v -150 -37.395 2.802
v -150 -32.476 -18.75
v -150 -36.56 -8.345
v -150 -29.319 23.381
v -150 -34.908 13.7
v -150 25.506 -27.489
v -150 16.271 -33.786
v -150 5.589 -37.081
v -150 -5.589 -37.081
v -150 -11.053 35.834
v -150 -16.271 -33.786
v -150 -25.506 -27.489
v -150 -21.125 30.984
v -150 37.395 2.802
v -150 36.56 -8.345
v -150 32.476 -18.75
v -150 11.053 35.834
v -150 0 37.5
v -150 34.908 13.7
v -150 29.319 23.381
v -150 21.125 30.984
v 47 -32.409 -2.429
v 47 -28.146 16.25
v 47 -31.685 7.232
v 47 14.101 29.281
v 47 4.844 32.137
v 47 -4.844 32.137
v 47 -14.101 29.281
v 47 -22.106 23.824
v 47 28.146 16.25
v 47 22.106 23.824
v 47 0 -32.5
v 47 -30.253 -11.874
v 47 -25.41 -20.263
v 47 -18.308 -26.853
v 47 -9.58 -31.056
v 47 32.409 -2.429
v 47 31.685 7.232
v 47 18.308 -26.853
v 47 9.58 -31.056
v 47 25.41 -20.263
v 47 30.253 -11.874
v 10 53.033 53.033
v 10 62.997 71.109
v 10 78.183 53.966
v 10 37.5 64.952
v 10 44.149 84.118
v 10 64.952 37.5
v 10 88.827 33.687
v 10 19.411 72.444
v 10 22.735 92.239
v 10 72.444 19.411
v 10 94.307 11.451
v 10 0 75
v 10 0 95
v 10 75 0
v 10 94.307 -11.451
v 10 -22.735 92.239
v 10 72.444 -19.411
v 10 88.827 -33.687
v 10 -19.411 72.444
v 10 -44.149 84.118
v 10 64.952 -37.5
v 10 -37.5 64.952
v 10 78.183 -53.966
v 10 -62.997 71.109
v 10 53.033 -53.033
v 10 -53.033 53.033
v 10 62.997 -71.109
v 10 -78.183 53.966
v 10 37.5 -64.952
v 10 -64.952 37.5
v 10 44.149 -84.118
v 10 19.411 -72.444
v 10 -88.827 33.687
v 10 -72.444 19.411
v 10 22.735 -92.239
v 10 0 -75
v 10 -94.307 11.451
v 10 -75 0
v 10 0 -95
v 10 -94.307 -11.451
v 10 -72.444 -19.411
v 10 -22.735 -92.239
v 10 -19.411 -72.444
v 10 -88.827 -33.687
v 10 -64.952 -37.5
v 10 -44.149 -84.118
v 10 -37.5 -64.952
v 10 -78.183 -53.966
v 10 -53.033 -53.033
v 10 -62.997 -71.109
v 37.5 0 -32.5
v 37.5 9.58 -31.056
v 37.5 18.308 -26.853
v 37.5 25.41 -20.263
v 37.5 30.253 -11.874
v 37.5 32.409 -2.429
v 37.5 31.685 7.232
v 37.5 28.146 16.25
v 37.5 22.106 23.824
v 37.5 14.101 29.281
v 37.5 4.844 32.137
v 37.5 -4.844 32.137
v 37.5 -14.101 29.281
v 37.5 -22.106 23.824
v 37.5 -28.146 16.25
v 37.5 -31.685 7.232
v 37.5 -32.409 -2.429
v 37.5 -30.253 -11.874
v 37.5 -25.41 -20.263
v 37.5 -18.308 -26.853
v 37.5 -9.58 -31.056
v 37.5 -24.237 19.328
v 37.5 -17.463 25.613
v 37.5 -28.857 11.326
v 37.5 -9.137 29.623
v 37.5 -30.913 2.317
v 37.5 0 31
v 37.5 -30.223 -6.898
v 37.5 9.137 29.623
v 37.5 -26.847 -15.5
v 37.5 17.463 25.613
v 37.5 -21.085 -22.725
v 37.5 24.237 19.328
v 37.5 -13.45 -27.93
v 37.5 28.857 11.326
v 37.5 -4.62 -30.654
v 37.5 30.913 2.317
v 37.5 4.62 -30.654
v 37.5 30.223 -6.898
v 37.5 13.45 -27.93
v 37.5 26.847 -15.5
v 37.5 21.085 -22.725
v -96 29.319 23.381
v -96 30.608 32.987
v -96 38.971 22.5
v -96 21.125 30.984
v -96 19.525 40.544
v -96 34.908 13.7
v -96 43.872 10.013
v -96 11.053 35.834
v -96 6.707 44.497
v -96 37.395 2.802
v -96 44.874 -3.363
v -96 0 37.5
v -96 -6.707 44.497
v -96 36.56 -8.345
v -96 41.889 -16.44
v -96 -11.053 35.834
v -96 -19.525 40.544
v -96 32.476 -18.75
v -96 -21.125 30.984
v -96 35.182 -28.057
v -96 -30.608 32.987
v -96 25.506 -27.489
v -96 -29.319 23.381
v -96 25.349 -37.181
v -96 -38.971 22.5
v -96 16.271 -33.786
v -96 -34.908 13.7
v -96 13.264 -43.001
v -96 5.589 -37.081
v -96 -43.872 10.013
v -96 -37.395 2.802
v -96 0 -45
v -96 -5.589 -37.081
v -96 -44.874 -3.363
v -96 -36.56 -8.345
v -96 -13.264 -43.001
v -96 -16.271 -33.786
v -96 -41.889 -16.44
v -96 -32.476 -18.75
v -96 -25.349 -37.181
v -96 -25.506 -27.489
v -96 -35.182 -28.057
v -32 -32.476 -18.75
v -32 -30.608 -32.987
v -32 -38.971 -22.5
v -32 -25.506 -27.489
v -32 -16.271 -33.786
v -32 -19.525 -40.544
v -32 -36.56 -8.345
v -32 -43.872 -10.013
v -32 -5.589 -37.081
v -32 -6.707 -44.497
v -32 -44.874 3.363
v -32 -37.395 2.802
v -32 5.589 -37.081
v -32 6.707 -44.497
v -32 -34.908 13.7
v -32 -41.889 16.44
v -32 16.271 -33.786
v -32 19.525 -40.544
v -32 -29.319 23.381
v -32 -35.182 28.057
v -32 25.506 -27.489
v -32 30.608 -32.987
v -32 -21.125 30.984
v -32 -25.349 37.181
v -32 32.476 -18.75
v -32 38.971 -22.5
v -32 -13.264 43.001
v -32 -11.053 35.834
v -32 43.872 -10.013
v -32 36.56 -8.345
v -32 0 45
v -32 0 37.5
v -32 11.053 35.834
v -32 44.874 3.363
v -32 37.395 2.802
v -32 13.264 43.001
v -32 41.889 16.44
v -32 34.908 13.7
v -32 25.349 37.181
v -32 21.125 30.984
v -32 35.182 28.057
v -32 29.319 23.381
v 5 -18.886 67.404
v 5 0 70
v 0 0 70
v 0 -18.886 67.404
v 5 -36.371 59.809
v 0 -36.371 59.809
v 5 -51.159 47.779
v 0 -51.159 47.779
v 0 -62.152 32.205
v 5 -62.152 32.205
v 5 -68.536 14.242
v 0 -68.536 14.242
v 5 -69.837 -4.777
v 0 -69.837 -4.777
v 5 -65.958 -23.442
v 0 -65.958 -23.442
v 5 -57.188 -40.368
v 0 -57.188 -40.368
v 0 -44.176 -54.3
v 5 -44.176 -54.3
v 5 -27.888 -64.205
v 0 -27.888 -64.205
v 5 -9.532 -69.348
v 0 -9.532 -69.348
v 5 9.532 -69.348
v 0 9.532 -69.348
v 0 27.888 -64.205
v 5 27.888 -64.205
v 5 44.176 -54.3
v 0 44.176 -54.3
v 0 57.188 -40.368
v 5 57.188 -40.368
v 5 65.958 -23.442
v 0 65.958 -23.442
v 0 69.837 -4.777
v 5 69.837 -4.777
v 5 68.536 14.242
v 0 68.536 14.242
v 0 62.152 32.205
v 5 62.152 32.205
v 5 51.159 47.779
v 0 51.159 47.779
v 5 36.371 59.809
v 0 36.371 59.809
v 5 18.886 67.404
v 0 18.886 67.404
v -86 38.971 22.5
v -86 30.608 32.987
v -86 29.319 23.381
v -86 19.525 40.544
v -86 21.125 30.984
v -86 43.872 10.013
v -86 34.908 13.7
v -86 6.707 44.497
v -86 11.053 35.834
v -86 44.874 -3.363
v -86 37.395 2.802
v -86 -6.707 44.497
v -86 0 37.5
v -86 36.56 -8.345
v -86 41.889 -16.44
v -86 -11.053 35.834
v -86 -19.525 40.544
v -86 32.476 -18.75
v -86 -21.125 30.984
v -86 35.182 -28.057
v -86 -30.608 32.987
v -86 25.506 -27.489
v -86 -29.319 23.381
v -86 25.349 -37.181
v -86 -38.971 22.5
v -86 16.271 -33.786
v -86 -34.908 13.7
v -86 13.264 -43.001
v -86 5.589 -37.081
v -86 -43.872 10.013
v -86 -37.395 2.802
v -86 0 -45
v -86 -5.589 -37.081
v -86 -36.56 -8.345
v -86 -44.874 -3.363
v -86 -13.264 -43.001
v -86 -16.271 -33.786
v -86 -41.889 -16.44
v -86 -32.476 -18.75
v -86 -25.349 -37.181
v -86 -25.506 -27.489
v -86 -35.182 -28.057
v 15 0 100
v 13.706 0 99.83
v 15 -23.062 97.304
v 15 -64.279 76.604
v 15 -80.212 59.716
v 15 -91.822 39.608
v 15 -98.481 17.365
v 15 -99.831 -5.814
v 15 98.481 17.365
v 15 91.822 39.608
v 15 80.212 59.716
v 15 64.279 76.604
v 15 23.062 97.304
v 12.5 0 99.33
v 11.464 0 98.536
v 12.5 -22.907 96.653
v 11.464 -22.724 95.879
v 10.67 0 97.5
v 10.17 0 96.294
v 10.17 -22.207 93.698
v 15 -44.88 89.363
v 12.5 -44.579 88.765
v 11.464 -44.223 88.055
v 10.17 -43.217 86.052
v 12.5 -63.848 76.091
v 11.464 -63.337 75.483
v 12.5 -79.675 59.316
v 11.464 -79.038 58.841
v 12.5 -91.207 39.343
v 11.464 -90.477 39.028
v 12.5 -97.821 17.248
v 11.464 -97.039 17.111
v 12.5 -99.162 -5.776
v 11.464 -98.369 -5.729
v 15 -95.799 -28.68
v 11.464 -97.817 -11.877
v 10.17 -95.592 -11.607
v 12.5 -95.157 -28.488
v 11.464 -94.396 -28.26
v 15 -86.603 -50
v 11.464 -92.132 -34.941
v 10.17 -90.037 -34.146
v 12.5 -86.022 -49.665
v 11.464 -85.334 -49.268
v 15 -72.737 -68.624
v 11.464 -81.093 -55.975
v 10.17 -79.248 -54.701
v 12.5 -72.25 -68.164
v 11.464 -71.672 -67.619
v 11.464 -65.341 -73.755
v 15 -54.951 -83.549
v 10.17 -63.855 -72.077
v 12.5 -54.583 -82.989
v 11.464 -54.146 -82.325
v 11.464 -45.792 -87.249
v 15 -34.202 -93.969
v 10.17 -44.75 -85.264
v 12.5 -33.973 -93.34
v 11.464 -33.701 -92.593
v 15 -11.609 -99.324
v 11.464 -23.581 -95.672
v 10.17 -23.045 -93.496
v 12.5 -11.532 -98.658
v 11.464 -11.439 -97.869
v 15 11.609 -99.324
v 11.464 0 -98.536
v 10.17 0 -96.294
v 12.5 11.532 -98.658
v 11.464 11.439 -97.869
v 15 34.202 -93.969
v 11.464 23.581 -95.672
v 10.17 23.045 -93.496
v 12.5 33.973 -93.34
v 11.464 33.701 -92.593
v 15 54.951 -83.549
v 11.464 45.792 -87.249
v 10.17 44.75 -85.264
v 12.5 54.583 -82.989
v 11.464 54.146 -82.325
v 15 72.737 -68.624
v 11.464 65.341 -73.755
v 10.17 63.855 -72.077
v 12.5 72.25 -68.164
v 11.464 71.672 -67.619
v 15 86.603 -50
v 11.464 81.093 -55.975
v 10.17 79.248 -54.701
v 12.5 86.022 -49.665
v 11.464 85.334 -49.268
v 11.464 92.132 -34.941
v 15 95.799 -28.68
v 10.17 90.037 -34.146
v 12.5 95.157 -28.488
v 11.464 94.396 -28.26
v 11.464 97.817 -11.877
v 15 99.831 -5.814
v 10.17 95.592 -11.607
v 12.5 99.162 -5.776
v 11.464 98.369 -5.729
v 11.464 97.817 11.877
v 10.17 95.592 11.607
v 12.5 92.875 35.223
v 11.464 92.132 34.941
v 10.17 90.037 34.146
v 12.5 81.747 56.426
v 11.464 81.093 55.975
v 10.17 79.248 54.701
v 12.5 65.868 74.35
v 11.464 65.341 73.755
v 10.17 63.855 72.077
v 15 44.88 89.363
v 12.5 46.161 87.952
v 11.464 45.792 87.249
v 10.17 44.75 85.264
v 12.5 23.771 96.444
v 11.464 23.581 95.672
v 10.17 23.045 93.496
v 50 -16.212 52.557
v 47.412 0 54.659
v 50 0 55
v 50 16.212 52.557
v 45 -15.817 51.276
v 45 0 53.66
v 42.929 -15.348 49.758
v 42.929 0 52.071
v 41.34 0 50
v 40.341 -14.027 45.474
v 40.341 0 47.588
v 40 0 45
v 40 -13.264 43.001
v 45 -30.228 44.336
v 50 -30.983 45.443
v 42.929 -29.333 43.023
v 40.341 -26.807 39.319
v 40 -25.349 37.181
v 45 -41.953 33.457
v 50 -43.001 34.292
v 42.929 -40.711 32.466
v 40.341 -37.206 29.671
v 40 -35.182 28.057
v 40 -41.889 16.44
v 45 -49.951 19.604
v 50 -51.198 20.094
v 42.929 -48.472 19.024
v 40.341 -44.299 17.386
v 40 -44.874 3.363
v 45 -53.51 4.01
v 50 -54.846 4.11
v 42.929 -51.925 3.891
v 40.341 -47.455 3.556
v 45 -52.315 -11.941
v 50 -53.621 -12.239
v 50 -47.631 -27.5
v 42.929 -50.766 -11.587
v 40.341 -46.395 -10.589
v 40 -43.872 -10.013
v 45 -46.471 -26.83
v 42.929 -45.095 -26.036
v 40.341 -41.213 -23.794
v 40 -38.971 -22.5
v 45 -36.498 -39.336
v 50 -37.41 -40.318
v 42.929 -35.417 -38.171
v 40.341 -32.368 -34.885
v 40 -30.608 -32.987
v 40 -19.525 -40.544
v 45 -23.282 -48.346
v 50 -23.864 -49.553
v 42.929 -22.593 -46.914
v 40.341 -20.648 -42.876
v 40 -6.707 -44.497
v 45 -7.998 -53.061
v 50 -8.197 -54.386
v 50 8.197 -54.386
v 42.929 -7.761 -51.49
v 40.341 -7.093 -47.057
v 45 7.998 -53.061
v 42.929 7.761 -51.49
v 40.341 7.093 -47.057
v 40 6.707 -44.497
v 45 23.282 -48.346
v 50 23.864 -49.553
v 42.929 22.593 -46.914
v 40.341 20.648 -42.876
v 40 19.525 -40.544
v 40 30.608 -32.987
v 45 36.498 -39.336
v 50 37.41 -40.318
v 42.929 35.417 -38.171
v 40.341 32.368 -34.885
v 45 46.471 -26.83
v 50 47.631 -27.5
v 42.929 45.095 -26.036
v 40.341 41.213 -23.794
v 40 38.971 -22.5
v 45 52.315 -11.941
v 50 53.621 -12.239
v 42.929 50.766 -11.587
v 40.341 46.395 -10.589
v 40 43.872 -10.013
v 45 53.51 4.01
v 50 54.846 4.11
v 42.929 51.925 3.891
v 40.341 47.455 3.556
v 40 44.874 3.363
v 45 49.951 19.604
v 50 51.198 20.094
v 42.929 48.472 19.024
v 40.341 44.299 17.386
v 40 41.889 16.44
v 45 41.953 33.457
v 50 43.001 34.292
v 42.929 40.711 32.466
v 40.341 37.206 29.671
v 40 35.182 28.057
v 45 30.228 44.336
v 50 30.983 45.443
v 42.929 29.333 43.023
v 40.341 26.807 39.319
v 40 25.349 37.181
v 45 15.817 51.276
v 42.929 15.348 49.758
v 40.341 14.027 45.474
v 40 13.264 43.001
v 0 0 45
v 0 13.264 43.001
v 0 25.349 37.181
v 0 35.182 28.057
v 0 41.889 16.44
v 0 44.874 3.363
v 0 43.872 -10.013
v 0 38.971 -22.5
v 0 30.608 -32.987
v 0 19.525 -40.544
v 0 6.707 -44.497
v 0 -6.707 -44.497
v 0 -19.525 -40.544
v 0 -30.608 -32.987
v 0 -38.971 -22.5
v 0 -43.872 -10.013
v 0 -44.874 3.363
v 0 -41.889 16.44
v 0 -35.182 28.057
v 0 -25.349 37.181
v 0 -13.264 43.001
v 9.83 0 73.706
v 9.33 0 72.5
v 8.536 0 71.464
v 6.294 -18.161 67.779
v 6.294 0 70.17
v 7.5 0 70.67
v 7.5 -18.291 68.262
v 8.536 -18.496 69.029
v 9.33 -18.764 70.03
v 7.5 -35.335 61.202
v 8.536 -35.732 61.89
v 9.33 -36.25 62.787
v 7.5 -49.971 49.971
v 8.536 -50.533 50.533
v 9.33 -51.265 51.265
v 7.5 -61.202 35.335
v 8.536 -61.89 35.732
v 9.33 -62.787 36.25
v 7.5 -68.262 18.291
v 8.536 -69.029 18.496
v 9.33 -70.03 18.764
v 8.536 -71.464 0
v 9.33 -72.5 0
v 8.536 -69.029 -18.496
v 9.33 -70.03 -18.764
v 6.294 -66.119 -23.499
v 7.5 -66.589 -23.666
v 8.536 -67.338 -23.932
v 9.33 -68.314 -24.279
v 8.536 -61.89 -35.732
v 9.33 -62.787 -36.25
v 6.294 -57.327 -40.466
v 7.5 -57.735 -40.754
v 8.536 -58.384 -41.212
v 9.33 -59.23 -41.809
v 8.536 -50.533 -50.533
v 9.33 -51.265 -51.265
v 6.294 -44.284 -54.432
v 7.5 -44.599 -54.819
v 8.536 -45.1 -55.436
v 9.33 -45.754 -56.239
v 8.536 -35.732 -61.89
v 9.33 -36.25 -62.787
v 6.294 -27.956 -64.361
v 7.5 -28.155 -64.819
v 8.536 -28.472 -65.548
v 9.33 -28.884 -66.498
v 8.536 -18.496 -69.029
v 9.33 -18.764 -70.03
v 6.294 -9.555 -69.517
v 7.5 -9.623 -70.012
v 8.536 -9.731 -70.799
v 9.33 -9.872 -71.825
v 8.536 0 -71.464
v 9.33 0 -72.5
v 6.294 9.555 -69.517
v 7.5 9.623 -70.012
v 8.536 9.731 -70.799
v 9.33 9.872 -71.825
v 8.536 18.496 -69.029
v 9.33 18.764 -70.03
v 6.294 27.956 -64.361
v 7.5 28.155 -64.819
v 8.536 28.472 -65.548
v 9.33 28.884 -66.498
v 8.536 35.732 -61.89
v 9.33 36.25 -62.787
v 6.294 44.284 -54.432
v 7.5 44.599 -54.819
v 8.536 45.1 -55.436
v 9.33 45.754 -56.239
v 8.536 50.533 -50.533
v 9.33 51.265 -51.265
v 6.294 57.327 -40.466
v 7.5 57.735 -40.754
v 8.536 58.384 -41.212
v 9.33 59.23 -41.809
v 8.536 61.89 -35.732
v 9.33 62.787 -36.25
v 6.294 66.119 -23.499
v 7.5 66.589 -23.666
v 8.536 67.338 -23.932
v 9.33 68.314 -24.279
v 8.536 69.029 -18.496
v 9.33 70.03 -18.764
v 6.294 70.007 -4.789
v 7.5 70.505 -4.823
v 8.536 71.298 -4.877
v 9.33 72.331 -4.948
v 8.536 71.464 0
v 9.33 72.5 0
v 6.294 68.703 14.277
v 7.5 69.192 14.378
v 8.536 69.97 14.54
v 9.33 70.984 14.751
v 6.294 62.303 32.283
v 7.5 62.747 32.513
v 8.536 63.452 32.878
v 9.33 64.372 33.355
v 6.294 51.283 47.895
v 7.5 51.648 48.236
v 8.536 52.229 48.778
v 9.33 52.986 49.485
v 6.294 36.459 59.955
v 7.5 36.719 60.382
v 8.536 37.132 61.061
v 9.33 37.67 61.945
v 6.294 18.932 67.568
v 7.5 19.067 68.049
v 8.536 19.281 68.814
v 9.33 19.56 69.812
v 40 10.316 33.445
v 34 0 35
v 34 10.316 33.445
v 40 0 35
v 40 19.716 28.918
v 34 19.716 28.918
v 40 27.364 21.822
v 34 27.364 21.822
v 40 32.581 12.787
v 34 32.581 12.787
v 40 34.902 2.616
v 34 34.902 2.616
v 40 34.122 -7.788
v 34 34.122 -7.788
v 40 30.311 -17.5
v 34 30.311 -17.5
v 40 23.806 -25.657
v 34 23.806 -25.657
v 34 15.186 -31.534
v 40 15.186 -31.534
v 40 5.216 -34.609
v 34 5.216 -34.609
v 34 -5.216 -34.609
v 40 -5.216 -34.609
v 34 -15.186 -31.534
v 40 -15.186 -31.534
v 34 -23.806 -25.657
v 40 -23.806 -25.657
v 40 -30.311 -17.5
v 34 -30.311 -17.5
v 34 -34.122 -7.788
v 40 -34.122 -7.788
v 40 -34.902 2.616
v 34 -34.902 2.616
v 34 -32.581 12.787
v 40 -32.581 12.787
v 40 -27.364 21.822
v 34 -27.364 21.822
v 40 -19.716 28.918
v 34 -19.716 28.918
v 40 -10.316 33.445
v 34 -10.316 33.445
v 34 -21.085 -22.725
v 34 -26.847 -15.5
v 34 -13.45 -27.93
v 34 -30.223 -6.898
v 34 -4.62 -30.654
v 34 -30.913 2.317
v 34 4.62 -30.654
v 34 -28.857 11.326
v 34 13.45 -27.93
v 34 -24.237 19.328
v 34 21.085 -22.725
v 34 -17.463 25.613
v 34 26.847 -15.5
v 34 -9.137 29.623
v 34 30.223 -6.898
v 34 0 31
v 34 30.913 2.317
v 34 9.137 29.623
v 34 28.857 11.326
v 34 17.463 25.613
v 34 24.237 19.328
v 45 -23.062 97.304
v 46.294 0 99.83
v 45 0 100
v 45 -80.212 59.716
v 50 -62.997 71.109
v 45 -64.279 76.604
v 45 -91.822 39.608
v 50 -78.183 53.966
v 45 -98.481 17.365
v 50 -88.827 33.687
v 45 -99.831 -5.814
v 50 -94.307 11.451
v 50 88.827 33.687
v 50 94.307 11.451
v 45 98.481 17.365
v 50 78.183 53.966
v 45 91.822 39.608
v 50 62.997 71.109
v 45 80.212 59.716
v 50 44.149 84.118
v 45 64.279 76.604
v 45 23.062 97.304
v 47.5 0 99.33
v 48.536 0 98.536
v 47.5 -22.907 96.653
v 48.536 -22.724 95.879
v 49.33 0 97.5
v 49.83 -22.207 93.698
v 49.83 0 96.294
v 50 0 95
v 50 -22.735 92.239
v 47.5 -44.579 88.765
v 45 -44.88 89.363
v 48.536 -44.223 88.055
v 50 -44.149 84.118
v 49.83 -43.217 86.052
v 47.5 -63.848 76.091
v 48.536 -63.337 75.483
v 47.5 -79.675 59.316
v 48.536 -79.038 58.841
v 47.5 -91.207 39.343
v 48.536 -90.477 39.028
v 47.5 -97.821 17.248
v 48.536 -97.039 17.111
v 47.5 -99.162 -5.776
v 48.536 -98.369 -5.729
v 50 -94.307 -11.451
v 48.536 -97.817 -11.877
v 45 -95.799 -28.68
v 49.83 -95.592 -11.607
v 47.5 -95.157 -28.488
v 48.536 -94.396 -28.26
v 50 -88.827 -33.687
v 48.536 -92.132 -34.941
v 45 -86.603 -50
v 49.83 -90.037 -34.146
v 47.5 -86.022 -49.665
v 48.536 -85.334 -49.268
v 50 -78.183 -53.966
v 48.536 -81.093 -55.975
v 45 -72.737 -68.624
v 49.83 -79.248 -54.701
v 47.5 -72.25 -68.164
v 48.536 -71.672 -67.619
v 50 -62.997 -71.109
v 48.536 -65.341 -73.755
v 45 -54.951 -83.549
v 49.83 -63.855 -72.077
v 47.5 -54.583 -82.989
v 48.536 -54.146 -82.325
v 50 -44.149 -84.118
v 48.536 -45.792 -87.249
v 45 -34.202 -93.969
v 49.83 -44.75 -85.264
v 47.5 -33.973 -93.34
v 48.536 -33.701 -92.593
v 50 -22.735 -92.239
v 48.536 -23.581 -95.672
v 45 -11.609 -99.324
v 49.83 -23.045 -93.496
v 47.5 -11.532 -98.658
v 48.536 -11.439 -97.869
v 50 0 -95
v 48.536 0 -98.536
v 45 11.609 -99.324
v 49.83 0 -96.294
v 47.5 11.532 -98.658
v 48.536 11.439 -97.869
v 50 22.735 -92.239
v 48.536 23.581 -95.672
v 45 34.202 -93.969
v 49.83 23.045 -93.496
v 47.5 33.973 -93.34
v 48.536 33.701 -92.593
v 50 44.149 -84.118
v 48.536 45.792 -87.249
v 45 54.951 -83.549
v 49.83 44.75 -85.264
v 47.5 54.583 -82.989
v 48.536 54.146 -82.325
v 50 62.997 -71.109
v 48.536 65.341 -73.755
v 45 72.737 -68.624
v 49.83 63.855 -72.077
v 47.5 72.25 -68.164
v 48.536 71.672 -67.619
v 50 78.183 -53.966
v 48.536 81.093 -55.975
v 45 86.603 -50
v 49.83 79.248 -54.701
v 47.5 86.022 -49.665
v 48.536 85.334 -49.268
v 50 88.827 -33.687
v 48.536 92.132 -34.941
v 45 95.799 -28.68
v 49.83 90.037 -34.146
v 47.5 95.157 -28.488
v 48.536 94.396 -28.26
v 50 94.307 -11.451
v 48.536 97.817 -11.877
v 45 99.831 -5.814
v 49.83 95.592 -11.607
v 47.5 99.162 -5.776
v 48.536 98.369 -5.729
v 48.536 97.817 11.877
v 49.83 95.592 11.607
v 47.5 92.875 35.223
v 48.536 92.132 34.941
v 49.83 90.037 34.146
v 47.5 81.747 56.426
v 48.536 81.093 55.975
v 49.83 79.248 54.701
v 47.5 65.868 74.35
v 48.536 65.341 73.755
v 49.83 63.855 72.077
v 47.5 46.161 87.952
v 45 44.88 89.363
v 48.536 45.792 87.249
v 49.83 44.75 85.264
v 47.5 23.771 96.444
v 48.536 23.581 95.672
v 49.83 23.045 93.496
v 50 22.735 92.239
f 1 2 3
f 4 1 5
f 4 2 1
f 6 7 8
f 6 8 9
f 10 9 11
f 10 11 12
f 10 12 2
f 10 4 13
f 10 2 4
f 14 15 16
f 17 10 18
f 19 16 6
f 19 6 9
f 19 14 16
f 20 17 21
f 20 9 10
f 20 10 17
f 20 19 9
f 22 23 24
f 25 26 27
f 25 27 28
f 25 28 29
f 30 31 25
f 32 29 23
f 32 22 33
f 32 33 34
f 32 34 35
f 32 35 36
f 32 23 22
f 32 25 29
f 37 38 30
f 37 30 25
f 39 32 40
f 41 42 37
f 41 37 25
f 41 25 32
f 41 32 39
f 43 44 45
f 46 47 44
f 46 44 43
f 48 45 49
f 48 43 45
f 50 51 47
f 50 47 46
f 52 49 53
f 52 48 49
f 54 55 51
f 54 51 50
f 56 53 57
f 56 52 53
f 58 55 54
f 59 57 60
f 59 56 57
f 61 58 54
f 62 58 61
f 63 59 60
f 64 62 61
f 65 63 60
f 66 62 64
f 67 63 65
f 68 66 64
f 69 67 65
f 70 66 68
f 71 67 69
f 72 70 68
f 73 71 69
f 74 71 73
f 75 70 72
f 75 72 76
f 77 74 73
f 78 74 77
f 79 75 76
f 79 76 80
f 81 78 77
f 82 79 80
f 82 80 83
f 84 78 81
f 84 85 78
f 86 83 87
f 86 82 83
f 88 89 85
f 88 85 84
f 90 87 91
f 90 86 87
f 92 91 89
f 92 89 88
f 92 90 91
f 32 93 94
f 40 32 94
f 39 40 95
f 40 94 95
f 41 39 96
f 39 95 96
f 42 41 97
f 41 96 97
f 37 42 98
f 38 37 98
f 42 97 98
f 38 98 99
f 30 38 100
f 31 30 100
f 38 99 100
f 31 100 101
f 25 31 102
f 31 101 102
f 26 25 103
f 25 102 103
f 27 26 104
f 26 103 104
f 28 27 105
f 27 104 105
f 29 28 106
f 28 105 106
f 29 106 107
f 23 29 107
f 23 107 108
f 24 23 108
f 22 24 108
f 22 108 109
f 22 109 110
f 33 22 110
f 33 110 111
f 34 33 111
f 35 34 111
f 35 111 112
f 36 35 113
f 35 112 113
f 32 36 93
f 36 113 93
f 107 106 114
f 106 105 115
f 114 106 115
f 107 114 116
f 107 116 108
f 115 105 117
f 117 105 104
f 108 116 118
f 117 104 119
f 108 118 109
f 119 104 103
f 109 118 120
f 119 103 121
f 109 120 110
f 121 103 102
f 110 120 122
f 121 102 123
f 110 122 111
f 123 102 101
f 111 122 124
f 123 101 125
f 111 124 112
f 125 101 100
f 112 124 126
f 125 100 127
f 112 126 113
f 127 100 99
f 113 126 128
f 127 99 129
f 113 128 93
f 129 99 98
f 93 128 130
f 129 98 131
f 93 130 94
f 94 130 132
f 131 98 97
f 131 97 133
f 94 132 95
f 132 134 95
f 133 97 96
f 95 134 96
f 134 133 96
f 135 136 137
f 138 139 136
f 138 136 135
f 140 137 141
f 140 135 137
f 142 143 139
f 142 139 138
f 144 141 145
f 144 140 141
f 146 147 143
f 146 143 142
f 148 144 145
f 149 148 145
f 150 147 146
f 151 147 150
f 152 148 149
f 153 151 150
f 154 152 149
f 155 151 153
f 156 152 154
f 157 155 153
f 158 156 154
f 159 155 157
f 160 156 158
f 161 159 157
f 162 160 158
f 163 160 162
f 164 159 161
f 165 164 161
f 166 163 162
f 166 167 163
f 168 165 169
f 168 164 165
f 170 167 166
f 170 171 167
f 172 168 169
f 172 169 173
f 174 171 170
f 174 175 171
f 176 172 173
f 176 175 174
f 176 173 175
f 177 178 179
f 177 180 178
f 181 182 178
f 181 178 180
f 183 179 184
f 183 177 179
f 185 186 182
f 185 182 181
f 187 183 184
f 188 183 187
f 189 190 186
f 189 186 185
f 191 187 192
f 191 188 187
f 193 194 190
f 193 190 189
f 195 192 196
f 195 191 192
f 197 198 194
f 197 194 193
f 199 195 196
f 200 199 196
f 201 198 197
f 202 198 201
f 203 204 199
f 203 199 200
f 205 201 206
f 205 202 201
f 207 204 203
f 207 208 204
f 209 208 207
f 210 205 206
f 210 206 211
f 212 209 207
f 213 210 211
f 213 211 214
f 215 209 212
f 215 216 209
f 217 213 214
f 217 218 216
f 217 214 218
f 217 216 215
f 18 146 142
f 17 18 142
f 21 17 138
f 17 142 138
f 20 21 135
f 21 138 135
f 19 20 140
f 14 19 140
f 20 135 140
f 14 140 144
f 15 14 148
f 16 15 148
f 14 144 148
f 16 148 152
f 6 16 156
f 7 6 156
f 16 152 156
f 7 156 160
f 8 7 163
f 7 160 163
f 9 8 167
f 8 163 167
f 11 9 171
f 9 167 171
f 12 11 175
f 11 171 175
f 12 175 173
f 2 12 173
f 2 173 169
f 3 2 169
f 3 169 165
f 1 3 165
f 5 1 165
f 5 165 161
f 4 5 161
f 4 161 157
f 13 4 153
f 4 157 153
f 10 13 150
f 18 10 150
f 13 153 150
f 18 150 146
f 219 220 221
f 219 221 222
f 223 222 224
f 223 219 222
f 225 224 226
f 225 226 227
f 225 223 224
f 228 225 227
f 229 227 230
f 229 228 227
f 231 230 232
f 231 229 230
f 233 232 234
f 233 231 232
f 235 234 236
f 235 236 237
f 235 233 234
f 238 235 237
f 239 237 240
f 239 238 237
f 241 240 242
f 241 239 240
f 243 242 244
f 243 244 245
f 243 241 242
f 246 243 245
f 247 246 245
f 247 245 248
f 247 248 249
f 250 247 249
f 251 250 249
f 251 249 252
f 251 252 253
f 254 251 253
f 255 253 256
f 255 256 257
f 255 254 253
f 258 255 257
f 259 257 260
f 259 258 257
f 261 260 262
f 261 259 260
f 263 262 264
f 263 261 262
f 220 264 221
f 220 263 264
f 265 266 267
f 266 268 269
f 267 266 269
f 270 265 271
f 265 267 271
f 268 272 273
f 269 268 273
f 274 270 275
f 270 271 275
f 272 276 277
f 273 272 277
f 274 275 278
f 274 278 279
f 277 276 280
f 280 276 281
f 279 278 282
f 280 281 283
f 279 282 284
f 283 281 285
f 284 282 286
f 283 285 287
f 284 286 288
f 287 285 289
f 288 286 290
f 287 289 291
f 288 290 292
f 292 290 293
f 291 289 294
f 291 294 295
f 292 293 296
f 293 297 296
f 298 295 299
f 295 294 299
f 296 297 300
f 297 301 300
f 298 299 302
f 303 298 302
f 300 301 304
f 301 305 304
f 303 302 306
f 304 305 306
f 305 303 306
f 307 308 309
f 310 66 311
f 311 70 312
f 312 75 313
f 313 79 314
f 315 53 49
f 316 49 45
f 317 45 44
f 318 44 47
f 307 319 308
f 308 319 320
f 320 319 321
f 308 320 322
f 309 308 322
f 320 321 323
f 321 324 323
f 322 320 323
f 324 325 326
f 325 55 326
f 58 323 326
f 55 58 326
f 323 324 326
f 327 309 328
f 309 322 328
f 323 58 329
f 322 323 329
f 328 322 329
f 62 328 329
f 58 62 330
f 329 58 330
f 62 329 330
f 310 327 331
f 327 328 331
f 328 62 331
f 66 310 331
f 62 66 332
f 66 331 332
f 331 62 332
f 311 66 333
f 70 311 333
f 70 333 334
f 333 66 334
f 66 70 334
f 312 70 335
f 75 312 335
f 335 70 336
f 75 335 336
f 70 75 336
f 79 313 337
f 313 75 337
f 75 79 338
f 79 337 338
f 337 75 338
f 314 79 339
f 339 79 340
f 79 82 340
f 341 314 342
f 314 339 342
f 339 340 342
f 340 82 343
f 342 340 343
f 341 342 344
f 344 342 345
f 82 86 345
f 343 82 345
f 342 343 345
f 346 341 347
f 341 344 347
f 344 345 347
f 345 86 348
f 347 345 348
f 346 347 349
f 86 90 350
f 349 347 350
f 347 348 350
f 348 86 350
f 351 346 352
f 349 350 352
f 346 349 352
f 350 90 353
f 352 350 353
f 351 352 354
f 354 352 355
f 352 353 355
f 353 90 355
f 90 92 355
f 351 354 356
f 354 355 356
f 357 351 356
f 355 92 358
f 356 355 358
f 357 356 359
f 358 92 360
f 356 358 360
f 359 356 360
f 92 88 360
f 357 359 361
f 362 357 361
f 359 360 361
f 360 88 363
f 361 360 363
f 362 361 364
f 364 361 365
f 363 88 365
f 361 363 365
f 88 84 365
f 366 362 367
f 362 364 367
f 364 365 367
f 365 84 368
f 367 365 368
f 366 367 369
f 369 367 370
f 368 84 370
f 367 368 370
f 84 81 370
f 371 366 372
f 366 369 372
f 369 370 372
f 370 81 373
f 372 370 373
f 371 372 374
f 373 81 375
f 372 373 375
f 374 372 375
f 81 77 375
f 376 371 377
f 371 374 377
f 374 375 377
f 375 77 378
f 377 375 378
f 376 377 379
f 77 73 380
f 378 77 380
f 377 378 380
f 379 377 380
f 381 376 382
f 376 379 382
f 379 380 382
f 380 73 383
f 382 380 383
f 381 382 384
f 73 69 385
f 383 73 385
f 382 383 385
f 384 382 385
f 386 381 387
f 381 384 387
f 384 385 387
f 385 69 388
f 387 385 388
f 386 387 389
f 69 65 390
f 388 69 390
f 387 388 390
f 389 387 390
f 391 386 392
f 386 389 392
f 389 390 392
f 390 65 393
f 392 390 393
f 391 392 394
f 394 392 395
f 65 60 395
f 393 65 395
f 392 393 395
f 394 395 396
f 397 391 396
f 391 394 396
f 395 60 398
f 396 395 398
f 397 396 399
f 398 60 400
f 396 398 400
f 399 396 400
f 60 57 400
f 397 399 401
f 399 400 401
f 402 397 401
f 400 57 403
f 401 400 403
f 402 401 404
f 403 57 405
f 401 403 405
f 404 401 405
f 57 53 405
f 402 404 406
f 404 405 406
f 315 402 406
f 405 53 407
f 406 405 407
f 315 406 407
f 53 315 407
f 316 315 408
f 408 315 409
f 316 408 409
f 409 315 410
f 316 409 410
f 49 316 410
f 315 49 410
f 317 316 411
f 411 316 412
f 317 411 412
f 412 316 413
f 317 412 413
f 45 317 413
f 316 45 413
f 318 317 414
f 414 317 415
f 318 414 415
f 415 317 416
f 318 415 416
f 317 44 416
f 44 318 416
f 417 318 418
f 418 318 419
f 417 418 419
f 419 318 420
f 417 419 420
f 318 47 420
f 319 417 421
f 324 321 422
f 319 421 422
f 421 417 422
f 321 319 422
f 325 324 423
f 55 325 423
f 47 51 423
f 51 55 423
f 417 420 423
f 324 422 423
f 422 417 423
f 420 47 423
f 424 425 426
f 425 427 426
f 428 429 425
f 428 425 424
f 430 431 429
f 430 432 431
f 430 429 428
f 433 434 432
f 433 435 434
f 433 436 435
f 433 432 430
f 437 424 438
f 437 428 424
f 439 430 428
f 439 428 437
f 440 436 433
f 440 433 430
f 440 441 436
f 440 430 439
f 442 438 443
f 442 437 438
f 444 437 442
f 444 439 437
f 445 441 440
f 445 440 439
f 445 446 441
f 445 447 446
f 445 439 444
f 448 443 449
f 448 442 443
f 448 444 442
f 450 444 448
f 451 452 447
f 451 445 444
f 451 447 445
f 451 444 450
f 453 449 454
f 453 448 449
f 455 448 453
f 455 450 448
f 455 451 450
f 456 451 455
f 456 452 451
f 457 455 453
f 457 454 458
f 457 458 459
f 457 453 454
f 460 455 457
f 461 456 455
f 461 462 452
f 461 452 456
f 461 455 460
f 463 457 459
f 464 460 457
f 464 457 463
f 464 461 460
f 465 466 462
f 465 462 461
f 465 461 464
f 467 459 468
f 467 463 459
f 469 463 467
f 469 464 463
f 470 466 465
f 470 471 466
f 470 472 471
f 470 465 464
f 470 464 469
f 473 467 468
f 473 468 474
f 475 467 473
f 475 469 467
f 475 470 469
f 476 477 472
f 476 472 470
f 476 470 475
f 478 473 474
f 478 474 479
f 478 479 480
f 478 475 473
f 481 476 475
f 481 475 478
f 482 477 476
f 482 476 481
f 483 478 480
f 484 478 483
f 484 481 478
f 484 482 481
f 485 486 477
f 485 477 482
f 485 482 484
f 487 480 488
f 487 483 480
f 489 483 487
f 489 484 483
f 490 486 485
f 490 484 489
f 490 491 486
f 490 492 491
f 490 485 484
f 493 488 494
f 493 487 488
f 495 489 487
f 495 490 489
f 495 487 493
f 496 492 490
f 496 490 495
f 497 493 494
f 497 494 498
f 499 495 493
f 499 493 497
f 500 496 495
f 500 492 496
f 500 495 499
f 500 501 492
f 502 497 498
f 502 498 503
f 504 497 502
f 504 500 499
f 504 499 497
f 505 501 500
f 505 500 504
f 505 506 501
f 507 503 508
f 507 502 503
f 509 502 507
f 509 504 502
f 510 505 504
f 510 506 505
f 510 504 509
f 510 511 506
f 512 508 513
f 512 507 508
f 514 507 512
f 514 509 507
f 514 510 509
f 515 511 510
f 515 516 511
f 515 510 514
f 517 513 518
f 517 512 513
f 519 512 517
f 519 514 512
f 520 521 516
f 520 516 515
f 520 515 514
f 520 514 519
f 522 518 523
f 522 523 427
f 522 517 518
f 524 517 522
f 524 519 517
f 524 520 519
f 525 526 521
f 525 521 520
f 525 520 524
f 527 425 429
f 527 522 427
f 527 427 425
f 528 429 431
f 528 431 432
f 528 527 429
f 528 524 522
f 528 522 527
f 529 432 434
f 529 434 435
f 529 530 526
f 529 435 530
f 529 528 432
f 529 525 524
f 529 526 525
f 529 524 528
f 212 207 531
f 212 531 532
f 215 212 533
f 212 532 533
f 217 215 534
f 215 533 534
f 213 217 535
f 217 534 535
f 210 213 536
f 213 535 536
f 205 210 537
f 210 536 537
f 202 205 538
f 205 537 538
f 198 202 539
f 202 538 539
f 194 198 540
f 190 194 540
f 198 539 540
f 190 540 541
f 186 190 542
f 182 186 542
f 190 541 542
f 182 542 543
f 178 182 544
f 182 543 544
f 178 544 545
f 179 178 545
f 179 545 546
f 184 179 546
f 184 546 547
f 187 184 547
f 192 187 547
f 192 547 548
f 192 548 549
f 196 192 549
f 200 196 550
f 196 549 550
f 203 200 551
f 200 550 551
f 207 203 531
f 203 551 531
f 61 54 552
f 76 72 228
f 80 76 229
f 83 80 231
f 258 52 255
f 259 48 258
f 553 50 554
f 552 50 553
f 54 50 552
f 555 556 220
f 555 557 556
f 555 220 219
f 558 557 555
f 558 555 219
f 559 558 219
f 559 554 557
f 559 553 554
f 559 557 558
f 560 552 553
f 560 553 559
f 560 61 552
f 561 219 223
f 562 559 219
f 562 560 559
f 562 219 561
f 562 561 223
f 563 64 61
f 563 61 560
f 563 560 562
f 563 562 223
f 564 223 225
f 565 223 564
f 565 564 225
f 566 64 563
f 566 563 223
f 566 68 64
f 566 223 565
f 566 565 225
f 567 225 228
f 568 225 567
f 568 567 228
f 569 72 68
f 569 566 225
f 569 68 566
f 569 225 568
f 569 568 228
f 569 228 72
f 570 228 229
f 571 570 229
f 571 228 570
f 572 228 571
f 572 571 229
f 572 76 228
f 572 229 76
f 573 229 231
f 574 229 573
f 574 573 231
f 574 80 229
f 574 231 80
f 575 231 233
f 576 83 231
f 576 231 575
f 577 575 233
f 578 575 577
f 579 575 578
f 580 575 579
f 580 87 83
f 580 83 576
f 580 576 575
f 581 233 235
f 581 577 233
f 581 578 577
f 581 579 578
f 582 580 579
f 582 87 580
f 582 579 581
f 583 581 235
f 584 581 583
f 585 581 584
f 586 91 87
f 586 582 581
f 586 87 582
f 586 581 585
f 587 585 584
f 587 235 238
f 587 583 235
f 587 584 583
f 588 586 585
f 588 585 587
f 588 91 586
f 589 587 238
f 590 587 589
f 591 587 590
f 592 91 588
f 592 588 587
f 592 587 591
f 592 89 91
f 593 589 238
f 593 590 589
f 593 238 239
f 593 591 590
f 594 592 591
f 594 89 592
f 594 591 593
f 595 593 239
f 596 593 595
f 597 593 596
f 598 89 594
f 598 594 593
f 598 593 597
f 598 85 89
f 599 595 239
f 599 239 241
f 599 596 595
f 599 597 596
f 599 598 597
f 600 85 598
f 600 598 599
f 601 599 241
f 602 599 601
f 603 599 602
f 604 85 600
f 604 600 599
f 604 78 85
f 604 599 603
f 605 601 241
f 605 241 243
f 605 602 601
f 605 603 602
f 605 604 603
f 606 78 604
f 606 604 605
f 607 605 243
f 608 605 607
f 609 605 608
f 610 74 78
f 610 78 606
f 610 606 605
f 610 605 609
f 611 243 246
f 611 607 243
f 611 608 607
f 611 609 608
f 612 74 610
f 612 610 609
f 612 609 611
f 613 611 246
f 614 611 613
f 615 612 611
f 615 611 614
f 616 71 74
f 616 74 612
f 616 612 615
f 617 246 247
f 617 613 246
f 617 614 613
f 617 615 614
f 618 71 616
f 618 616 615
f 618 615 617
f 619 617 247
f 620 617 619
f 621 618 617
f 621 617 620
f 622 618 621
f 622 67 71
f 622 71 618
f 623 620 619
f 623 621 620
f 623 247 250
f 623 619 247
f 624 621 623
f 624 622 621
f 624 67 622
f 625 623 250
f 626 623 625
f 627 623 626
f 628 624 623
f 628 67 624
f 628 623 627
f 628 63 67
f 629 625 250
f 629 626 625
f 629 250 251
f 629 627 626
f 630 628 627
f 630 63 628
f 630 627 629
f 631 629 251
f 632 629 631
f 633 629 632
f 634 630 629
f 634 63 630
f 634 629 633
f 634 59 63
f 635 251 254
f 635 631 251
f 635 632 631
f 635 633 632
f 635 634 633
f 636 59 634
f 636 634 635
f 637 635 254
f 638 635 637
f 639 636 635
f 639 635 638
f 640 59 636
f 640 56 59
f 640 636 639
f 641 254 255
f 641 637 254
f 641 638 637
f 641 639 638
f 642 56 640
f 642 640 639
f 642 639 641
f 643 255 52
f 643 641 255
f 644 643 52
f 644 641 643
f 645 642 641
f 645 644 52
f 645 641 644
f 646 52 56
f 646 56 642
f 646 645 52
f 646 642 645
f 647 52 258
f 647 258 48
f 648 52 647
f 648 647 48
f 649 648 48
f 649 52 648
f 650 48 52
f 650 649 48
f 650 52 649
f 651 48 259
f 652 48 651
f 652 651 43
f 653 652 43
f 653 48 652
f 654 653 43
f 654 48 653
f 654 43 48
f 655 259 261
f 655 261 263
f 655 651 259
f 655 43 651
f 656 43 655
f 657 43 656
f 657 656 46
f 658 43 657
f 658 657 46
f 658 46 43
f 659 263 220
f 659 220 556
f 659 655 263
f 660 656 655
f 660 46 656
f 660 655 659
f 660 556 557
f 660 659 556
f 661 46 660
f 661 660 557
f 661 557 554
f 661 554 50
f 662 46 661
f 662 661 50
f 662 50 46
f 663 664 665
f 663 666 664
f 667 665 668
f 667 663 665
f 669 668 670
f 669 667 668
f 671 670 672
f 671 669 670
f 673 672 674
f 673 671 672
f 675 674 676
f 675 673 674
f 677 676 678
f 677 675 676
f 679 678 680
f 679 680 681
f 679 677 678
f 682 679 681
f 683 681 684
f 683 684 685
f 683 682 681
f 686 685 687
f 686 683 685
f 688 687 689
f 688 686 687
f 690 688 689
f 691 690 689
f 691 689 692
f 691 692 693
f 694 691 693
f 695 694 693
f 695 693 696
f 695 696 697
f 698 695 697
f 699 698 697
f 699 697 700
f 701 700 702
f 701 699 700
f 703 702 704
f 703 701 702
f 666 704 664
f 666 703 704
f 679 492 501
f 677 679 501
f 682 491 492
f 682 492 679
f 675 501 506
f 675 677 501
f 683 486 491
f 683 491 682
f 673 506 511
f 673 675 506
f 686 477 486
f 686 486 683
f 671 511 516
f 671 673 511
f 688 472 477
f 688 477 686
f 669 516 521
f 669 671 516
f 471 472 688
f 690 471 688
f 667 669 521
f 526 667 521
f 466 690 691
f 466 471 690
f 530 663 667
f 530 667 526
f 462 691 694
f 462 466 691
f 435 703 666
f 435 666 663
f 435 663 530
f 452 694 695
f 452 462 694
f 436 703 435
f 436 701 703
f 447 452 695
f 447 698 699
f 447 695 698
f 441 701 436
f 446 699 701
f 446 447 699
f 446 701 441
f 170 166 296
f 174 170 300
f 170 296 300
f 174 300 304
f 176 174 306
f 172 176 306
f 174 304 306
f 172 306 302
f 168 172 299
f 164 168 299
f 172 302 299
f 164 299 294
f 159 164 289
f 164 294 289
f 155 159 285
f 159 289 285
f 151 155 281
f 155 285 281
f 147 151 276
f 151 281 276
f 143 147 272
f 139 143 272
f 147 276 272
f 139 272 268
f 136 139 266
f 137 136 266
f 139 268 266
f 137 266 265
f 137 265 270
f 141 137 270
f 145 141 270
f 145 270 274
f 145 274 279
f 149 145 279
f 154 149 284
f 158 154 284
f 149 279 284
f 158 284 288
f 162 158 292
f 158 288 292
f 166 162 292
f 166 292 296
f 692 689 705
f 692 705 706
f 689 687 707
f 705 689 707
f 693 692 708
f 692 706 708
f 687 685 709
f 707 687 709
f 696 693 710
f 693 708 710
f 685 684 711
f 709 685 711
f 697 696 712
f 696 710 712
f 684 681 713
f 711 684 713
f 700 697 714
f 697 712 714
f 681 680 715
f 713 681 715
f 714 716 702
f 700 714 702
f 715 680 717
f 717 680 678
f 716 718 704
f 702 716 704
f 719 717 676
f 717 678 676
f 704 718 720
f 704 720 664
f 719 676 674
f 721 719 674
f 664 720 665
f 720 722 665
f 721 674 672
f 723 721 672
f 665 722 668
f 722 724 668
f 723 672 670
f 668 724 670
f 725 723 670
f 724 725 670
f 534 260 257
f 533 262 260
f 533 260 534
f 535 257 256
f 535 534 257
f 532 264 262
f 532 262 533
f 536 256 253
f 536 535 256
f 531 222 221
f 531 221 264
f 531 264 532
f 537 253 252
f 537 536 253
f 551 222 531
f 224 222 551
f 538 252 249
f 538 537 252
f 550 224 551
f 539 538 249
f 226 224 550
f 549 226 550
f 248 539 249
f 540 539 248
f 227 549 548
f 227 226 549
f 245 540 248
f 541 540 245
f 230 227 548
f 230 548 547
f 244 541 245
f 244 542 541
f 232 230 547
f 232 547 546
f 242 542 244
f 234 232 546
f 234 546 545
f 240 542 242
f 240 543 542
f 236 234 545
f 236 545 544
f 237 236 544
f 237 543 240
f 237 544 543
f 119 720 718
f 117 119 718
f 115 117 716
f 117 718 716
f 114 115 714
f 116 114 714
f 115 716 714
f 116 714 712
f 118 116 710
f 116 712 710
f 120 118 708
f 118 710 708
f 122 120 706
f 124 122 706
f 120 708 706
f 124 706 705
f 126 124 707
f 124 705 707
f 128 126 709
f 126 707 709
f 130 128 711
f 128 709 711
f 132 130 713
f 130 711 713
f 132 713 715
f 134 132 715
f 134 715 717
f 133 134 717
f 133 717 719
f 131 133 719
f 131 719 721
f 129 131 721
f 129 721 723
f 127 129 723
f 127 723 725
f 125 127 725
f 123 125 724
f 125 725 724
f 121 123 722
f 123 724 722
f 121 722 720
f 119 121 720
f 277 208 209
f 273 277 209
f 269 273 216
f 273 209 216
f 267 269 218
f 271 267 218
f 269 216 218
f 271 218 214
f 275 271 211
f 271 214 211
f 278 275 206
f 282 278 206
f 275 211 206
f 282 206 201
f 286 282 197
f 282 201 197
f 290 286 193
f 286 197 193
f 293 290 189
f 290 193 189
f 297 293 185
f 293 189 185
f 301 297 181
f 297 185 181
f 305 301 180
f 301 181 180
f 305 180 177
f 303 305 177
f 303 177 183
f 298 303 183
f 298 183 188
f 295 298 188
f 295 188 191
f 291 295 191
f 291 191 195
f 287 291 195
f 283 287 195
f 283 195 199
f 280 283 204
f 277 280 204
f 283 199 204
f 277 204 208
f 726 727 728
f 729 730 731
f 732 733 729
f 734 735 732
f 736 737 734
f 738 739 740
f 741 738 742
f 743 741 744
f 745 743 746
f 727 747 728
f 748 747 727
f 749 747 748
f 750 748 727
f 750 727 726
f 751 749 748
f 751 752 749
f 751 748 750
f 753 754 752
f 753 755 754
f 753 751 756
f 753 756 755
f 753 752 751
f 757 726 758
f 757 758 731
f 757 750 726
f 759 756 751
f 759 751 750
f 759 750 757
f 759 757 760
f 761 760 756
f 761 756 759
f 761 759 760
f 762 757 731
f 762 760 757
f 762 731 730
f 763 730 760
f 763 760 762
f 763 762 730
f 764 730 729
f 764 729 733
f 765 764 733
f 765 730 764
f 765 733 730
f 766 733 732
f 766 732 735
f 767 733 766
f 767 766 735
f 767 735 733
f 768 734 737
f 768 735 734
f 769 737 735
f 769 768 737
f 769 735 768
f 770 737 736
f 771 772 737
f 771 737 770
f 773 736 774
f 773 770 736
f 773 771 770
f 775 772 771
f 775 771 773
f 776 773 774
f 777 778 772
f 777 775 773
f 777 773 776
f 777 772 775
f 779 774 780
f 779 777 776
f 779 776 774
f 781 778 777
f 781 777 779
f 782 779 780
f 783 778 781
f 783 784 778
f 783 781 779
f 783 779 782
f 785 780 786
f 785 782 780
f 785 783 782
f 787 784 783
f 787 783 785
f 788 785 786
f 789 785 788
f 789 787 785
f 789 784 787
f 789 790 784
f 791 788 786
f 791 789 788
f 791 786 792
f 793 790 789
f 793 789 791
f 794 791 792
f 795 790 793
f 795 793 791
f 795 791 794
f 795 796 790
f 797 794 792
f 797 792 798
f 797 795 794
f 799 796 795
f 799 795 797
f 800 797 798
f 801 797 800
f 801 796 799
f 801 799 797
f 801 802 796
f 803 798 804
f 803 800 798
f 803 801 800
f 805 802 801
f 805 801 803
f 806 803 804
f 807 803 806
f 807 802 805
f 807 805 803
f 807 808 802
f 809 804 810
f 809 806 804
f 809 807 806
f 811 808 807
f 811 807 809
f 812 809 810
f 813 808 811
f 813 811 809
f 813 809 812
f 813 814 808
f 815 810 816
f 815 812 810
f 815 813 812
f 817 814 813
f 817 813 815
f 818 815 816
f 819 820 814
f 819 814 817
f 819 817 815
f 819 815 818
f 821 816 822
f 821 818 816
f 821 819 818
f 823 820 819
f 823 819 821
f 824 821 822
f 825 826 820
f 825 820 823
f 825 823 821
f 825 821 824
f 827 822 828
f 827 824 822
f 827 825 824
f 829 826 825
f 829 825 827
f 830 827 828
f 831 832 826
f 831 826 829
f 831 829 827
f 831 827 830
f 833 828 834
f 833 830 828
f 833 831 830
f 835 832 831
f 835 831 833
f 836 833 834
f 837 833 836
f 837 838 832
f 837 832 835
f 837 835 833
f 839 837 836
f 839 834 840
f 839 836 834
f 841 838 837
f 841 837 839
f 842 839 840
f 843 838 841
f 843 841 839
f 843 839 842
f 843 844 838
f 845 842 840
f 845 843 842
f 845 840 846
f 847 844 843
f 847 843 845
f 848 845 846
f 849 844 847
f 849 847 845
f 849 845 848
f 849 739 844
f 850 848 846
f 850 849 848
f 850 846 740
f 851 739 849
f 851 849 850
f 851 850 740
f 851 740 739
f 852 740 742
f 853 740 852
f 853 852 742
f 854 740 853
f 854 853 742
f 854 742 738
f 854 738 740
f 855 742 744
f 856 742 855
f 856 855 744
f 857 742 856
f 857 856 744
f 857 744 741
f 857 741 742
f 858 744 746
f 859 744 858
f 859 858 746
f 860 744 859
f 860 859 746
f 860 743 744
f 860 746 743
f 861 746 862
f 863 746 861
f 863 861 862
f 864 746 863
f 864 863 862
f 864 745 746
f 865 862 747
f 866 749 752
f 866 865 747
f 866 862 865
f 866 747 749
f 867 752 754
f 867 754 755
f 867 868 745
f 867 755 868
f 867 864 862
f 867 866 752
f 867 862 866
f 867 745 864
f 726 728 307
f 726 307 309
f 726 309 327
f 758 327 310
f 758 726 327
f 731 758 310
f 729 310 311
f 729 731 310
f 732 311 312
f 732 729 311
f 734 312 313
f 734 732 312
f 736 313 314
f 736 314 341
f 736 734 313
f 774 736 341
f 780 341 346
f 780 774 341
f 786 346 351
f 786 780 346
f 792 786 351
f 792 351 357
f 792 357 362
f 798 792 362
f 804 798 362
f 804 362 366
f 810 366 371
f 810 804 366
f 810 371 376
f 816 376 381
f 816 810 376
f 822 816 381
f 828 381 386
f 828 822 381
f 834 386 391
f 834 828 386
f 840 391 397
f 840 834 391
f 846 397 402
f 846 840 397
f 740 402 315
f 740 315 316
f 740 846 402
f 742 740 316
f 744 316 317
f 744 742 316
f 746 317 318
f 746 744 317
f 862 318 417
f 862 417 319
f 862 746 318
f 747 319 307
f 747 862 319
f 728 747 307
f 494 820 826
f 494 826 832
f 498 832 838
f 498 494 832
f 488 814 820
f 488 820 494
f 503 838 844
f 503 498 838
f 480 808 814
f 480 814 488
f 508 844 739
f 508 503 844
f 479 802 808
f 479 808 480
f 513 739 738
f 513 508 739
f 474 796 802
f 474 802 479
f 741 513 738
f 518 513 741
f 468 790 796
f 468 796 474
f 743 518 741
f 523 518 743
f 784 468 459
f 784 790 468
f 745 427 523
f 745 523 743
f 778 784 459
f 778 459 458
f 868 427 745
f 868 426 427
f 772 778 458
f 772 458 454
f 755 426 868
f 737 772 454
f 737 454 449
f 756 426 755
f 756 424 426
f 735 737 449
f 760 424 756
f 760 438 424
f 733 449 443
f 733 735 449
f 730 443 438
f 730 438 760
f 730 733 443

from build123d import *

# Parameters (mm, degrees)
FILLET_1_R      = 5
FILLET_2_R      = 10
SKETCH_2_R      = 45
SKETCH_2_R_2    = 35
EXTRUDE_1_DEPTH = 32
SKETCH_3_R      = 35
EXTRUDE_2_DEPTH = 66
SKETCH_4_R      = 37.5
EXTRUDE_3_DEPTH = 54
SKETCH_5_R      = 45
EXTRUDE_4_DEPTH = 10
SKETCH_6_R      = 37.5
EXTRUDE_5_DEPTH = 54
SKETCH_9_R      = 31
EXTRUDE_8_DEPTH = 3.5
SKETCH_10_R     = 32.5
EXTRUDE_9_DEPTH = 9.5


with BuildPart() as part:
    # 草图1 → 旋转1 (revolve)
    with BuildSketch(Plane.XY, mode=Mode.PRIVATE) as revolve_1_sk:
        Polygon((10, 100), (50, 100), (50, 55), (40, 55), (40, 35), (0, 35), (0, 70), (10, 70), align=None)
    revolve(revolve_1_sk.sketch.rotate(Axis((-1000, 0, 0), (1, 0, 0)), 90), axis=Axis((-1000, 0, 0), (1, 0, 0)))

    # 圆角1
    fillet_1_edges = [part.edges().sort_by_distance(p)[0] for p in [
        (10, 0, -70),
        (50, 0, -100),
        (10, 0, -100),
    ]]
    fillet(fillet_1_edges, radius=FILLET_1_R)

    # 圆角2
    fillet_2_edges = [part.edges().sort_by_distance(p)[0] for p in [
        (40, 0, -55),
    ]]
    fillet(fillet_2_edges, radius=FILLET_2_R - 0.0001)  # a hair under: the kernel refuses the full size



with BuildPart() as body_2:
    # 草图2 → 凸台-拉伸1 (new body)
    with BuildSketch(Plane.ZY):
        Circle(SKETCH_2_R)
        Circle(SKETCH_2_R_2, mode=Mode.SUBTRACT)
    extrude(amount=EXTRUDE_1_DEPTH)


with BuildPart() as part_1:
    add(part.part)

    add(body_2.part)  # 凸台-拉伸2 merges body 2
    # 草图3 → 凸台-拉伸2 (add)
    with BuildSketch(Plane.ZY.offset(32)):
        Circle(SKETCH_3_R)
    extrude(amount=-EXTRUDE_2_DEPTH)

    # 草图4 → 凸台-拉伸3 (add)
    with BuildSketch(Plane.ZY.offset(32)):
        Circle(SKETCH_4_R)
    extrude(amount=EXTRUDE_3_DEPTH)

    # 草图5 → 凸台-拉伸4 (add)
    with BuildSketch(Plane.ZY.offset(86)):
        with Locations(Location((0, 0, 0), (0, 0, 180))):
            Circle(SKETCH_5_R)
    extrude(amount=EXTRUDE_4_DEPTH)

    # 草图6 → 凸台-拉伸5 (add)
    with BuildSketch(Plane.ZY.offset(96)):
        Circle(SKETCH_6_R)
    extrude(amount=EXTRUDE_5_DEPTH)

    # 草图9 → 凸台-拉伸8 (add)
    with BuildSketch(Plane(origin=(34, 0, 0), x_dir=(0, 0, -1), z_dir=(1, 0, 0))):
        with Locations(Location((0, 0, 0), (0, 0, 180))):
            Circle(SKETCH_9_R)
    extrude(amount=EXTRUDE_8_DEPTH)

    # 草图10 → 凸台-拉伸9 (add)
    with BuildSketch(Plane(origin=(37.5, 0, 0), x_dir=(0, 0, -1), z_dir=(1, 0, 0))):
        Circle(SKETCH_10_R)
    extrude(amount=EXTRUDE_9_DEPTH)


solid = part_1.part
